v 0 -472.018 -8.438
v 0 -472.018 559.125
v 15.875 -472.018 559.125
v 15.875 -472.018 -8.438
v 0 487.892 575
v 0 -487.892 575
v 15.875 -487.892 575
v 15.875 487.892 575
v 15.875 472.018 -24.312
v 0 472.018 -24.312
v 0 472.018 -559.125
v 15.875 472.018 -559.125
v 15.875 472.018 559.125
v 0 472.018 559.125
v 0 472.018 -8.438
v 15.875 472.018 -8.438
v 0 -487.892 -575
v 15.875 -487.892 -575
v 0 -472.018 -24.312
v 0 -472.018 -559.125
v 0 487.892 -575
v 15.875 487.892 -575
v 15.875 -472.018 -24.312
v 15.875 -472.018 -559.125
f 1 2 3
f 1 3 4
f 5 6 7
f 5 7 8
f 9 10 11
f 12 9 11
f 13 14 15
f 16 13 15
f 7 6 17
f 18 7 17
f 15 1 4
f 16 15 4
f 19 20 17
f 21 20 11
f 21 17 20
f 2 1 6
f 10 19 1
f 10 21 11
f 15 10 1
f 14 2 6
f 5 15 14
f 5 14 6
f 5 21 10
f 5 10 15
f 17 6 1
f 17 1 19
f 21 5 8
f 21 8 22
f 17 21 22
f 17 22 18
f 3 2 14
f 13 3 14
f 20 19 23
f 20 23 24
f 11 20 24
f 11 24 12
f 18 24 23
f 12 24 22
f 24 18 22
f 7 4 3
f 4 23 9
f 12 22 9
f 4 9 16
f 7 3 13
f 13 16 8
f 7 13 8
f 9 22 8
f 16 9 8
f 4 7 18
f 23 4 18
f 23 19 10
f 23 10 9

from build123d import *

# Parameters (mm, degrees)
SKETCH1_W           = 1118.25
SKETCH1_H           = 944.035
BOSS_EXTRUDE1_DEPTH = 15.875
BOSS_EXTRUDE3_REACH = 961.91
SKETCH3_W           = 15.875
SKETCH3_H           = 15.875


with BuildPart() as part:
    # Sketch1 → Boss-Extrude1 (new body)
    with BuildSketch(Plane(origin=(0, 0, 0), x_dir=(0, 0, -1), z_dir=(1, 0, 0))):
        Polygon((-575, -487.8925), (-575, 487.8925), (575, 487.8925), (575, -487.8925), (559.125, -487.8925), (-559.125, -487.8925), align=None)
        Rectangle(SKETCH1_W, SKETCH1_H, mode=Mode.SUBTRACT)
    extrude(amount=BOSS_EXTRUDE1_DEPTH)

    # Sketch3 → Boss-Extrude3 (add, up to next)
    with BuildSketch(Plane(origin=(0, -472.0175, 0), x_dir=(1, 0, 0), z_dir=(0, 1, 0)), mode=Mode.PRIVATE) as boss_extrude3_sk1:
        with Locations((7.9375, 16.375)):
            Rectangle(SKETCH3_W, SKETCH3_H)
    boss_extrude3_tool1 = extrude(boss_extrude3_sk1.sketch, amount=BOSS_EXTRUDE3_REACH, mode=Mode.PRIVATE) - part.part
    add(boss_extrude3_tool1.solids().sort_by_distance((7.9375, -472.0175, -16.375))[0])


solid = part.part
